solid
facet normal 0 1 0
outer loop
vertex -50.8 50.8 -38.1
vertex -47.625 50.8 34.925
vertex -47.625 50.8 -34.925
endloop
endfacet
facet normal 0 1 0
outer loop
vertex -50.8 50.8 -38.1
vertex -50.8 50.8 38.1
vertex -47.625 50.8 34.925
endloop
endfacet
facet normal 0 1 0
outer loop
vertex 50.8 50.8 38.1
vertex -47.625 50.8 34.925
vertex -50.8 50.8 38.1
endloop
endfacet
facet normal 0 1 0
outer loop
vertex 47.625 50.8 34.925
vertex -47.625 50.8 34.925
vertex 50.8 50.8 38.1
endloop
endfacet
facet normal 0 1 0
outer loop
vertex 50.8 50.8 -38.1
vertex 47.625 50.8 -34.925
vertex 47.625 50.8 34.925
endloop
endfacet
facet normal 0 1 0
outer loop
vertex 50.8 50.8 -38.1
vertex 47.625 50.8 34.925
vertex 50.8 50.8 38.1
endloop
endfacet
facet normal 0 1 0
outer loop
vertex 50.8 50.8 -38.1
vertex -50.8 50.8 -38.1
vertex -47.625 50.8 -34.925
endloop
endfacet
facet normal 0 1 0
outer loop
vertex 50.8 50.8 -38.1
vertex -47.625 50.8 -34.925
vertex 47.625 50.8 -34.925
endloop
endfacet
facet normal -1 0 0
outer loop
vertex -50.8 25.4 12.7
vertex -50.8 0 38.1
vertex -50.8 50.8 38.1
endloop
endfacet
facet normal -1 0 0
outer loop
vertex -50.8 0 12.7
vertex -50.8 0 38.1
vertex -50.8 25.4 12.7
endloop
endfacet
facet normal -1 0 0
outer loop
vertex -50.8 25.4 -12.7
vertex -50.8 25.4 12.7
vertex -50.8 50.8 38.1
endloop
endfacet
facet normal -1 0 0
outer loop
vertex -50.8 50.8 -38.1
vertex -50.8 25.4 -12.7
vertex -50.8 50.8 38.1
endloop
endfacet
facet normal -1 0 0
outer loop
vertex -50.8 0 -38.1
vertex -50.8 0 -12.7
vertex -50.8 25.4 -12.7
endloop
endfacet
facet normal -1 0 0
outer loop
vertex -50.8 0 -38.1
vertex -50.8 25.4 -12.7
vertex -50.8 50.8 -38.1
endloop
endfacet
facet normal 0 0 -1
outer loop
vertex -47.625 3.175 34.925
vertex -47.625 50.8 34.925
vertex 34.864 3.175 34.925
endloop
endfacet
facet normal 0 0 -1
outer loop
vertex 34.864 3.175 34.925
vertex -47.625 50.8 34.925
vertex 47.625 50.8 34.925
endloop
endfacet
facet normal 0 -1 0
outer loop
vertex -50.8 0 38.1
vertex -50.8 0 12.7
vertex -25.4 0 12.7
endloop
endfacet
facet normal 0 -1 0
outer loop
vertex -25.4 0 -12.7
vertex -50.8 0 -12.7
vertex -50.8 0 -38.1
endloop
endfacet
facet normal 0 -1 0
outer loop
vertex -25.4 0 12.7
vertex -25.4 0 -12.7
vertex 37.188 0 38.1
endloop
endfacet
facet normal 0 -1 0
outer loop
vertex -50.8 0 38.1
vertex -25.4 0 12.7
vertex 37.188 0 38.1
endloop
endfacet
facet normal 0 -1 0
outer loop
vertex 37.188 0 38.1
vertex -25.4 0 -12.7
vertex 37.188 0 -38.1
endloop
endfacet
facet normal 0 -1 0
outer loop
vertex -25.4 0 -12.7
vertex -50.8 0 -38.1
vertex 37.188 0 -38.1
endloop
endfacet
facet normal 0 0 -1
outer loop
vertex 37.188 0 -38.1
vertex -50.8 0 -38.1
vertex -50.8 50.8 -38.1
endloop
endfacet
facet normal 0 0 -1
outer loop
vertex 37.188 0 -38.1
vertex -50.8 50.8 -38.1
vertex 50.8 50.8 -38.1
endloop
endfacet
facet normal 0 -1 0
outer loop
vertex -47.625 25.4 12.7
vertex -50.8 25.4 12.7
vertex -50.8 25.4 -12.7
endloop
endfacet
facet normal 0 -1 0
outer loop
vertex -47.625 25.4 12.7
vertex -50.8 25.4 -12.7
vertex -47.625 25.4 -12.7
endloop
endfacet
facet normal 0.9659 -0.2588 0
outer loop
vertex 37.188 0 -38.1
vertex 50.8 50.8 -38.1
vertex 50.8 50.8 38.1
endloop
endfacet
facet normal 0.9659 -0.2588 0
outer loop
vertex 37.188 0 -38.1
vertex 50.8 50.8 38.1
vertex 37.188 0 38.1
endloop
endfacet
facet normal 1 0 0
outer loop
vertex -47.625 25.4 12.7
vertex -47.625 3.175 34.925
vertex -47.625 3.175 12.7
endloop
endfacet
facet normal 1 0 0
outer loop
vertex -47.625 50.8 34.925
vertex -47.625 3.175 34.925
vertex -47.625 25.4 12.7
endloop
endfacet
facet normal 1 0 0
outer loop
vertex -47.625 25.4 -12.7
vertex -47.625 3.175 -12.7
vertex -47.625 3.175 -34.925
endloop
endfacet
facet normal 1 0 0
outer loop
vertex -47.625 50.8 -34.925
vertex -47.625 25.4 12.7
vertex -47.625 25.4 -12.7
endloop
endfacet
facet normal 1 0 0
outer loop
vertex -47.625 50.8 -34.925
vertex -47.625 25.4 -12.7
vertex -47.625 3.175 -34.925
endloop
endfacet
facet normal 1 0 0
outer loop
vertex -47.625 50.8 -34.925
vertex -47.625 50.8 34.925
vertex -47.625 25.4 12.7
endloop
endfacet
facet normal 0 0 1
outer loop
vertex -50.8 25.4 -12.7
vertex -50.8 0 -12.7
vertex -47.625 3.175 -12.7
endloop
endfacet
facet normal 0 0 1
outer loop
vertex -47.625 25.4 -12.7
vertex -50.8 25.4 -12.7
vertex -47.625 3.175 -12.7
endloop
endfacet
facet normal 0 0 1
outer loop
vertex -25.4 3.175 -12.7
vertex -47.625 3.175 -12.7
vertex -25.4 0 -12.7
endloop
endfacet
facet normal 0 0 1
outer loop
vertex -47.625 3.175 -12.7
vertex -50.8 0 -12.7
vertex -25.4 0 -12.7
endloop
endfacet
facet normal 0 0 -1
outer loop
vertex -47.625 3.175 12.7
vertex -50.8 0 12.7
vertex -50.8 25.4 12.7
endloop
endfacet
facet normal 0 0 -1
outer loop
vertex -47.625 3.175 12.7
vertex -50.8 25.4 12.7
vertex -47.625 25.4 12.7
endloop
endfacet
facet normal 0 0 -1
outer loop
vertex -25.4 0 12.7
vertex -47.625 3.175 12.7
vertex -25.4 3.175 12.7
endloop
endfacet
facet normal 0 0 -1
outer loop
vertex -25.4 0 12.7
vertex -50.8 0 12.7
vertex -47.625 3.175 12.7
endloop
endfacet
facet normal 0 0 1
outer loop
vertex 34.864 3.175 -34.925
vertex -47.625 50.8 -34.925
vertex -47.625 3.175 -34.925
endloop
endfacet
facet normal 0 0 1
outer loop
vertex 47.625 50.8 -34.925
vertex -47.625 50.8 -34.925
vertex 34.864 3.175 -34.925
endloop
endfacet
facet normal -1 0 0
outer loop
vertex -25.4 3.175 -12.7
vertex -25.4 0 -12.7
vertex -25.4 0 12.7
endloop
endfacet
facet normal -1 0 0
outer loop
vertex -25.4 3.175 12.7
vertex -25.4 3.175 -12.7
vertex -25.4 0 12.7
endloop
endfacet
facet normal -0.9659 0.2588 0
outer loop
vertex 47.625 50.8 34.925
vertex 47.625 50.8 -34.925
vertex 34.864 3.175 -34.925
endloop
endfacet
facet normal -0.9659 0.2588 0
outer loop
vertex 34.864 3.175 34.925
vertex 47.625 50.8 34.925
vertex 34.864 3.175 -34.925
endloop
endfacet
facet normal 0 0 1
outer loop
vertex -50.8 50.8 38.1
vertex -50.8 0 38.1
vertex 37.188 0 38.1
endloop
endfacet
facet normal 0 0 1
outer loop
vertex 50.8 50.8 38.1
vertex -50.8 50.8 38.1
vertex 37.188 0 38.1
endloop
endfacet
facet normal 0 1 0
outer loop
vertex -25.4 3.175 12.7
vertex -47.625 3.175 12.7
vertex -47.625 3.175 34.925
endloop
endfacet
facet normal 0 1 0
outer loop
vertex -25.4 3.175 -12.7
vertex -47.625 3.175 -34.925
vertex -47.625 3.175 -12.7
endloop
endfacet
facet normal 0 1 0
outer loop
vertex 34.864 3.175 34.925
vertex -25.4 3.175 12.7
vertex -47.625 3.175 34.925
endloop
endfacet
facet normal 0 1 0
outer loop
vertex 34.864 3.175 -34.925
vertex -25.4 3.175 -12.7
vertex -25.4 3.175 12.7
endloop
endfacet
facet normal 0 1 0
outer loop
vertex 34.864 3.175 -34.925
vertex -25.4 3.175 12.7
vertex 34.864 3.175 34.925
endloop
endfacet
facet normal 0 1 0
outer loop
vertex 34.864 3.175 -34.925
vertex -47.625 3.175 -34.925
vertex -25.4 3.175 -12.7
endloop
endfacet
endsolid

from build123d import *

# Parameters (mm, degrees)
SKETCH10_W                = 101.6
SKETCH10_H                = 76.2
BOSS_EXTRUDE4_DEPTH       = 50.8
F_6_CLEARANCE_HOLE1_D     = 3.7973
F_6_CLEARANCE_HOLE1_DEPTH = 12.7
F_6_CLEARANCE_HOLE1_TIP   = 1.140824014
CUT_EXTRUDE6_DEPTH        = 105.726882891
BOSS_EXTRUDE6_DEPTH       = 73.025
SKETCH19_W                = 95.25
SKETCH19_H                = 69.85
CUT_EXTRUDE7_DEPTH        = 47.625
BOSS_EXTRUDE7_DEPTH       = 73.025
SKETCH21_W                = 25.4
SKETCH21_H                = 25.4
CUT_EXTRUDE8_DEPTH        = 25.4


with BuildPart() as part:
    # Sketch10 → Boss-Extrude4 (new body)
    with BuildSketch(Plane(origin=(0, 0, 0), x_dir=(1, 0, 0), z_dir=(0, 1, 0))):
        Rectangle(SKETCH10_W, SKETCH10_H)
    extrude(amount=BOSS_EXTRUDE4_DEPTH)

    # #6 Clearance Hole1
    with Locations(Plane(origin=(0, 50.8, 0), x_dir=(1, 0, 0), z_dir=(0, 1, 0))):
        with Locations((44.45, 5.55625), (44.45, -5.55625)):
            Hole(F_6_CLEARANCE_HOLE1_D / 2, depth=F_6_CLEARANCE_HOLE1_DEPTH)
            with Locations((0, 0, -(F_6_CLEARANCE_HOLE1_DEPTH + F_6_CLEARANCE_HOLE1_TIP / 2))):  # 118° drill point
                Cone(0, F_6_CLEARANCE_HOLE1_D / 2, F_6_CLEARANCE_HOLE1_TIP, mode=Mode.SUBTRACT)

    # Sketch17 → Cut-Extrude6 (cut, through all)
    with BuildSketch(Plane.XY.offset(38.1)):
        Polygon((50.8, 0), (50.8, 50.8), (37.188181024, 0), align=None)
    extrude(amount=-CUT_EXTRUDE6_DEPTH, mode=Mode.SUBTRACT)

    # Sketch18 → Boss-Extrude6 (add)
    with BuildSketch(Plane.XY.offset(38.1)):
        Polygon((47.625, 50.8), (34.013181024, 0), (37.188181024, 0), (50.8, 50.8), align=None)
    extrude(amount=-BOSS_EXTRUDE6_DEPTH)

    # Sketch19 → Cut-Extrude7 (cut)
    with BuildSketch(Plane(origin=(0, 50.8, 0), x_dir=(1, 0, 0), z_dir=(0, 1, 0))):
        Rectangle(SKETCH19_W, SKETCH19_H)
    extrude(amount=-CUT_EXTRUDE7_DEPTH, mode=Mode.SUBTRACT)

    # Sketch20 → Boss-Extrude7 (add)
    with BuildSketch(Plane.XY.offset(38.1)):
        Polygon((47.625, 50.8), (34.013181024, 0), (37.188181024, 0), (50.8, 50.8), align=None)
    extrude(amount=-BOSS_EXTRUDE7_DEPTH)

    # Sketch21 → Cut-Extrude8 (cut)
    with BuildSketch(Plane.XZ):
        with Locations((-38.1, 0)):
            Rectangle(SKETCH21_W, SKETCH21_H)
    extrude(amount=-CUT_EXTRUDE8_DEPTH, mode=Mode.SUBTRACT)


solid = part.part
